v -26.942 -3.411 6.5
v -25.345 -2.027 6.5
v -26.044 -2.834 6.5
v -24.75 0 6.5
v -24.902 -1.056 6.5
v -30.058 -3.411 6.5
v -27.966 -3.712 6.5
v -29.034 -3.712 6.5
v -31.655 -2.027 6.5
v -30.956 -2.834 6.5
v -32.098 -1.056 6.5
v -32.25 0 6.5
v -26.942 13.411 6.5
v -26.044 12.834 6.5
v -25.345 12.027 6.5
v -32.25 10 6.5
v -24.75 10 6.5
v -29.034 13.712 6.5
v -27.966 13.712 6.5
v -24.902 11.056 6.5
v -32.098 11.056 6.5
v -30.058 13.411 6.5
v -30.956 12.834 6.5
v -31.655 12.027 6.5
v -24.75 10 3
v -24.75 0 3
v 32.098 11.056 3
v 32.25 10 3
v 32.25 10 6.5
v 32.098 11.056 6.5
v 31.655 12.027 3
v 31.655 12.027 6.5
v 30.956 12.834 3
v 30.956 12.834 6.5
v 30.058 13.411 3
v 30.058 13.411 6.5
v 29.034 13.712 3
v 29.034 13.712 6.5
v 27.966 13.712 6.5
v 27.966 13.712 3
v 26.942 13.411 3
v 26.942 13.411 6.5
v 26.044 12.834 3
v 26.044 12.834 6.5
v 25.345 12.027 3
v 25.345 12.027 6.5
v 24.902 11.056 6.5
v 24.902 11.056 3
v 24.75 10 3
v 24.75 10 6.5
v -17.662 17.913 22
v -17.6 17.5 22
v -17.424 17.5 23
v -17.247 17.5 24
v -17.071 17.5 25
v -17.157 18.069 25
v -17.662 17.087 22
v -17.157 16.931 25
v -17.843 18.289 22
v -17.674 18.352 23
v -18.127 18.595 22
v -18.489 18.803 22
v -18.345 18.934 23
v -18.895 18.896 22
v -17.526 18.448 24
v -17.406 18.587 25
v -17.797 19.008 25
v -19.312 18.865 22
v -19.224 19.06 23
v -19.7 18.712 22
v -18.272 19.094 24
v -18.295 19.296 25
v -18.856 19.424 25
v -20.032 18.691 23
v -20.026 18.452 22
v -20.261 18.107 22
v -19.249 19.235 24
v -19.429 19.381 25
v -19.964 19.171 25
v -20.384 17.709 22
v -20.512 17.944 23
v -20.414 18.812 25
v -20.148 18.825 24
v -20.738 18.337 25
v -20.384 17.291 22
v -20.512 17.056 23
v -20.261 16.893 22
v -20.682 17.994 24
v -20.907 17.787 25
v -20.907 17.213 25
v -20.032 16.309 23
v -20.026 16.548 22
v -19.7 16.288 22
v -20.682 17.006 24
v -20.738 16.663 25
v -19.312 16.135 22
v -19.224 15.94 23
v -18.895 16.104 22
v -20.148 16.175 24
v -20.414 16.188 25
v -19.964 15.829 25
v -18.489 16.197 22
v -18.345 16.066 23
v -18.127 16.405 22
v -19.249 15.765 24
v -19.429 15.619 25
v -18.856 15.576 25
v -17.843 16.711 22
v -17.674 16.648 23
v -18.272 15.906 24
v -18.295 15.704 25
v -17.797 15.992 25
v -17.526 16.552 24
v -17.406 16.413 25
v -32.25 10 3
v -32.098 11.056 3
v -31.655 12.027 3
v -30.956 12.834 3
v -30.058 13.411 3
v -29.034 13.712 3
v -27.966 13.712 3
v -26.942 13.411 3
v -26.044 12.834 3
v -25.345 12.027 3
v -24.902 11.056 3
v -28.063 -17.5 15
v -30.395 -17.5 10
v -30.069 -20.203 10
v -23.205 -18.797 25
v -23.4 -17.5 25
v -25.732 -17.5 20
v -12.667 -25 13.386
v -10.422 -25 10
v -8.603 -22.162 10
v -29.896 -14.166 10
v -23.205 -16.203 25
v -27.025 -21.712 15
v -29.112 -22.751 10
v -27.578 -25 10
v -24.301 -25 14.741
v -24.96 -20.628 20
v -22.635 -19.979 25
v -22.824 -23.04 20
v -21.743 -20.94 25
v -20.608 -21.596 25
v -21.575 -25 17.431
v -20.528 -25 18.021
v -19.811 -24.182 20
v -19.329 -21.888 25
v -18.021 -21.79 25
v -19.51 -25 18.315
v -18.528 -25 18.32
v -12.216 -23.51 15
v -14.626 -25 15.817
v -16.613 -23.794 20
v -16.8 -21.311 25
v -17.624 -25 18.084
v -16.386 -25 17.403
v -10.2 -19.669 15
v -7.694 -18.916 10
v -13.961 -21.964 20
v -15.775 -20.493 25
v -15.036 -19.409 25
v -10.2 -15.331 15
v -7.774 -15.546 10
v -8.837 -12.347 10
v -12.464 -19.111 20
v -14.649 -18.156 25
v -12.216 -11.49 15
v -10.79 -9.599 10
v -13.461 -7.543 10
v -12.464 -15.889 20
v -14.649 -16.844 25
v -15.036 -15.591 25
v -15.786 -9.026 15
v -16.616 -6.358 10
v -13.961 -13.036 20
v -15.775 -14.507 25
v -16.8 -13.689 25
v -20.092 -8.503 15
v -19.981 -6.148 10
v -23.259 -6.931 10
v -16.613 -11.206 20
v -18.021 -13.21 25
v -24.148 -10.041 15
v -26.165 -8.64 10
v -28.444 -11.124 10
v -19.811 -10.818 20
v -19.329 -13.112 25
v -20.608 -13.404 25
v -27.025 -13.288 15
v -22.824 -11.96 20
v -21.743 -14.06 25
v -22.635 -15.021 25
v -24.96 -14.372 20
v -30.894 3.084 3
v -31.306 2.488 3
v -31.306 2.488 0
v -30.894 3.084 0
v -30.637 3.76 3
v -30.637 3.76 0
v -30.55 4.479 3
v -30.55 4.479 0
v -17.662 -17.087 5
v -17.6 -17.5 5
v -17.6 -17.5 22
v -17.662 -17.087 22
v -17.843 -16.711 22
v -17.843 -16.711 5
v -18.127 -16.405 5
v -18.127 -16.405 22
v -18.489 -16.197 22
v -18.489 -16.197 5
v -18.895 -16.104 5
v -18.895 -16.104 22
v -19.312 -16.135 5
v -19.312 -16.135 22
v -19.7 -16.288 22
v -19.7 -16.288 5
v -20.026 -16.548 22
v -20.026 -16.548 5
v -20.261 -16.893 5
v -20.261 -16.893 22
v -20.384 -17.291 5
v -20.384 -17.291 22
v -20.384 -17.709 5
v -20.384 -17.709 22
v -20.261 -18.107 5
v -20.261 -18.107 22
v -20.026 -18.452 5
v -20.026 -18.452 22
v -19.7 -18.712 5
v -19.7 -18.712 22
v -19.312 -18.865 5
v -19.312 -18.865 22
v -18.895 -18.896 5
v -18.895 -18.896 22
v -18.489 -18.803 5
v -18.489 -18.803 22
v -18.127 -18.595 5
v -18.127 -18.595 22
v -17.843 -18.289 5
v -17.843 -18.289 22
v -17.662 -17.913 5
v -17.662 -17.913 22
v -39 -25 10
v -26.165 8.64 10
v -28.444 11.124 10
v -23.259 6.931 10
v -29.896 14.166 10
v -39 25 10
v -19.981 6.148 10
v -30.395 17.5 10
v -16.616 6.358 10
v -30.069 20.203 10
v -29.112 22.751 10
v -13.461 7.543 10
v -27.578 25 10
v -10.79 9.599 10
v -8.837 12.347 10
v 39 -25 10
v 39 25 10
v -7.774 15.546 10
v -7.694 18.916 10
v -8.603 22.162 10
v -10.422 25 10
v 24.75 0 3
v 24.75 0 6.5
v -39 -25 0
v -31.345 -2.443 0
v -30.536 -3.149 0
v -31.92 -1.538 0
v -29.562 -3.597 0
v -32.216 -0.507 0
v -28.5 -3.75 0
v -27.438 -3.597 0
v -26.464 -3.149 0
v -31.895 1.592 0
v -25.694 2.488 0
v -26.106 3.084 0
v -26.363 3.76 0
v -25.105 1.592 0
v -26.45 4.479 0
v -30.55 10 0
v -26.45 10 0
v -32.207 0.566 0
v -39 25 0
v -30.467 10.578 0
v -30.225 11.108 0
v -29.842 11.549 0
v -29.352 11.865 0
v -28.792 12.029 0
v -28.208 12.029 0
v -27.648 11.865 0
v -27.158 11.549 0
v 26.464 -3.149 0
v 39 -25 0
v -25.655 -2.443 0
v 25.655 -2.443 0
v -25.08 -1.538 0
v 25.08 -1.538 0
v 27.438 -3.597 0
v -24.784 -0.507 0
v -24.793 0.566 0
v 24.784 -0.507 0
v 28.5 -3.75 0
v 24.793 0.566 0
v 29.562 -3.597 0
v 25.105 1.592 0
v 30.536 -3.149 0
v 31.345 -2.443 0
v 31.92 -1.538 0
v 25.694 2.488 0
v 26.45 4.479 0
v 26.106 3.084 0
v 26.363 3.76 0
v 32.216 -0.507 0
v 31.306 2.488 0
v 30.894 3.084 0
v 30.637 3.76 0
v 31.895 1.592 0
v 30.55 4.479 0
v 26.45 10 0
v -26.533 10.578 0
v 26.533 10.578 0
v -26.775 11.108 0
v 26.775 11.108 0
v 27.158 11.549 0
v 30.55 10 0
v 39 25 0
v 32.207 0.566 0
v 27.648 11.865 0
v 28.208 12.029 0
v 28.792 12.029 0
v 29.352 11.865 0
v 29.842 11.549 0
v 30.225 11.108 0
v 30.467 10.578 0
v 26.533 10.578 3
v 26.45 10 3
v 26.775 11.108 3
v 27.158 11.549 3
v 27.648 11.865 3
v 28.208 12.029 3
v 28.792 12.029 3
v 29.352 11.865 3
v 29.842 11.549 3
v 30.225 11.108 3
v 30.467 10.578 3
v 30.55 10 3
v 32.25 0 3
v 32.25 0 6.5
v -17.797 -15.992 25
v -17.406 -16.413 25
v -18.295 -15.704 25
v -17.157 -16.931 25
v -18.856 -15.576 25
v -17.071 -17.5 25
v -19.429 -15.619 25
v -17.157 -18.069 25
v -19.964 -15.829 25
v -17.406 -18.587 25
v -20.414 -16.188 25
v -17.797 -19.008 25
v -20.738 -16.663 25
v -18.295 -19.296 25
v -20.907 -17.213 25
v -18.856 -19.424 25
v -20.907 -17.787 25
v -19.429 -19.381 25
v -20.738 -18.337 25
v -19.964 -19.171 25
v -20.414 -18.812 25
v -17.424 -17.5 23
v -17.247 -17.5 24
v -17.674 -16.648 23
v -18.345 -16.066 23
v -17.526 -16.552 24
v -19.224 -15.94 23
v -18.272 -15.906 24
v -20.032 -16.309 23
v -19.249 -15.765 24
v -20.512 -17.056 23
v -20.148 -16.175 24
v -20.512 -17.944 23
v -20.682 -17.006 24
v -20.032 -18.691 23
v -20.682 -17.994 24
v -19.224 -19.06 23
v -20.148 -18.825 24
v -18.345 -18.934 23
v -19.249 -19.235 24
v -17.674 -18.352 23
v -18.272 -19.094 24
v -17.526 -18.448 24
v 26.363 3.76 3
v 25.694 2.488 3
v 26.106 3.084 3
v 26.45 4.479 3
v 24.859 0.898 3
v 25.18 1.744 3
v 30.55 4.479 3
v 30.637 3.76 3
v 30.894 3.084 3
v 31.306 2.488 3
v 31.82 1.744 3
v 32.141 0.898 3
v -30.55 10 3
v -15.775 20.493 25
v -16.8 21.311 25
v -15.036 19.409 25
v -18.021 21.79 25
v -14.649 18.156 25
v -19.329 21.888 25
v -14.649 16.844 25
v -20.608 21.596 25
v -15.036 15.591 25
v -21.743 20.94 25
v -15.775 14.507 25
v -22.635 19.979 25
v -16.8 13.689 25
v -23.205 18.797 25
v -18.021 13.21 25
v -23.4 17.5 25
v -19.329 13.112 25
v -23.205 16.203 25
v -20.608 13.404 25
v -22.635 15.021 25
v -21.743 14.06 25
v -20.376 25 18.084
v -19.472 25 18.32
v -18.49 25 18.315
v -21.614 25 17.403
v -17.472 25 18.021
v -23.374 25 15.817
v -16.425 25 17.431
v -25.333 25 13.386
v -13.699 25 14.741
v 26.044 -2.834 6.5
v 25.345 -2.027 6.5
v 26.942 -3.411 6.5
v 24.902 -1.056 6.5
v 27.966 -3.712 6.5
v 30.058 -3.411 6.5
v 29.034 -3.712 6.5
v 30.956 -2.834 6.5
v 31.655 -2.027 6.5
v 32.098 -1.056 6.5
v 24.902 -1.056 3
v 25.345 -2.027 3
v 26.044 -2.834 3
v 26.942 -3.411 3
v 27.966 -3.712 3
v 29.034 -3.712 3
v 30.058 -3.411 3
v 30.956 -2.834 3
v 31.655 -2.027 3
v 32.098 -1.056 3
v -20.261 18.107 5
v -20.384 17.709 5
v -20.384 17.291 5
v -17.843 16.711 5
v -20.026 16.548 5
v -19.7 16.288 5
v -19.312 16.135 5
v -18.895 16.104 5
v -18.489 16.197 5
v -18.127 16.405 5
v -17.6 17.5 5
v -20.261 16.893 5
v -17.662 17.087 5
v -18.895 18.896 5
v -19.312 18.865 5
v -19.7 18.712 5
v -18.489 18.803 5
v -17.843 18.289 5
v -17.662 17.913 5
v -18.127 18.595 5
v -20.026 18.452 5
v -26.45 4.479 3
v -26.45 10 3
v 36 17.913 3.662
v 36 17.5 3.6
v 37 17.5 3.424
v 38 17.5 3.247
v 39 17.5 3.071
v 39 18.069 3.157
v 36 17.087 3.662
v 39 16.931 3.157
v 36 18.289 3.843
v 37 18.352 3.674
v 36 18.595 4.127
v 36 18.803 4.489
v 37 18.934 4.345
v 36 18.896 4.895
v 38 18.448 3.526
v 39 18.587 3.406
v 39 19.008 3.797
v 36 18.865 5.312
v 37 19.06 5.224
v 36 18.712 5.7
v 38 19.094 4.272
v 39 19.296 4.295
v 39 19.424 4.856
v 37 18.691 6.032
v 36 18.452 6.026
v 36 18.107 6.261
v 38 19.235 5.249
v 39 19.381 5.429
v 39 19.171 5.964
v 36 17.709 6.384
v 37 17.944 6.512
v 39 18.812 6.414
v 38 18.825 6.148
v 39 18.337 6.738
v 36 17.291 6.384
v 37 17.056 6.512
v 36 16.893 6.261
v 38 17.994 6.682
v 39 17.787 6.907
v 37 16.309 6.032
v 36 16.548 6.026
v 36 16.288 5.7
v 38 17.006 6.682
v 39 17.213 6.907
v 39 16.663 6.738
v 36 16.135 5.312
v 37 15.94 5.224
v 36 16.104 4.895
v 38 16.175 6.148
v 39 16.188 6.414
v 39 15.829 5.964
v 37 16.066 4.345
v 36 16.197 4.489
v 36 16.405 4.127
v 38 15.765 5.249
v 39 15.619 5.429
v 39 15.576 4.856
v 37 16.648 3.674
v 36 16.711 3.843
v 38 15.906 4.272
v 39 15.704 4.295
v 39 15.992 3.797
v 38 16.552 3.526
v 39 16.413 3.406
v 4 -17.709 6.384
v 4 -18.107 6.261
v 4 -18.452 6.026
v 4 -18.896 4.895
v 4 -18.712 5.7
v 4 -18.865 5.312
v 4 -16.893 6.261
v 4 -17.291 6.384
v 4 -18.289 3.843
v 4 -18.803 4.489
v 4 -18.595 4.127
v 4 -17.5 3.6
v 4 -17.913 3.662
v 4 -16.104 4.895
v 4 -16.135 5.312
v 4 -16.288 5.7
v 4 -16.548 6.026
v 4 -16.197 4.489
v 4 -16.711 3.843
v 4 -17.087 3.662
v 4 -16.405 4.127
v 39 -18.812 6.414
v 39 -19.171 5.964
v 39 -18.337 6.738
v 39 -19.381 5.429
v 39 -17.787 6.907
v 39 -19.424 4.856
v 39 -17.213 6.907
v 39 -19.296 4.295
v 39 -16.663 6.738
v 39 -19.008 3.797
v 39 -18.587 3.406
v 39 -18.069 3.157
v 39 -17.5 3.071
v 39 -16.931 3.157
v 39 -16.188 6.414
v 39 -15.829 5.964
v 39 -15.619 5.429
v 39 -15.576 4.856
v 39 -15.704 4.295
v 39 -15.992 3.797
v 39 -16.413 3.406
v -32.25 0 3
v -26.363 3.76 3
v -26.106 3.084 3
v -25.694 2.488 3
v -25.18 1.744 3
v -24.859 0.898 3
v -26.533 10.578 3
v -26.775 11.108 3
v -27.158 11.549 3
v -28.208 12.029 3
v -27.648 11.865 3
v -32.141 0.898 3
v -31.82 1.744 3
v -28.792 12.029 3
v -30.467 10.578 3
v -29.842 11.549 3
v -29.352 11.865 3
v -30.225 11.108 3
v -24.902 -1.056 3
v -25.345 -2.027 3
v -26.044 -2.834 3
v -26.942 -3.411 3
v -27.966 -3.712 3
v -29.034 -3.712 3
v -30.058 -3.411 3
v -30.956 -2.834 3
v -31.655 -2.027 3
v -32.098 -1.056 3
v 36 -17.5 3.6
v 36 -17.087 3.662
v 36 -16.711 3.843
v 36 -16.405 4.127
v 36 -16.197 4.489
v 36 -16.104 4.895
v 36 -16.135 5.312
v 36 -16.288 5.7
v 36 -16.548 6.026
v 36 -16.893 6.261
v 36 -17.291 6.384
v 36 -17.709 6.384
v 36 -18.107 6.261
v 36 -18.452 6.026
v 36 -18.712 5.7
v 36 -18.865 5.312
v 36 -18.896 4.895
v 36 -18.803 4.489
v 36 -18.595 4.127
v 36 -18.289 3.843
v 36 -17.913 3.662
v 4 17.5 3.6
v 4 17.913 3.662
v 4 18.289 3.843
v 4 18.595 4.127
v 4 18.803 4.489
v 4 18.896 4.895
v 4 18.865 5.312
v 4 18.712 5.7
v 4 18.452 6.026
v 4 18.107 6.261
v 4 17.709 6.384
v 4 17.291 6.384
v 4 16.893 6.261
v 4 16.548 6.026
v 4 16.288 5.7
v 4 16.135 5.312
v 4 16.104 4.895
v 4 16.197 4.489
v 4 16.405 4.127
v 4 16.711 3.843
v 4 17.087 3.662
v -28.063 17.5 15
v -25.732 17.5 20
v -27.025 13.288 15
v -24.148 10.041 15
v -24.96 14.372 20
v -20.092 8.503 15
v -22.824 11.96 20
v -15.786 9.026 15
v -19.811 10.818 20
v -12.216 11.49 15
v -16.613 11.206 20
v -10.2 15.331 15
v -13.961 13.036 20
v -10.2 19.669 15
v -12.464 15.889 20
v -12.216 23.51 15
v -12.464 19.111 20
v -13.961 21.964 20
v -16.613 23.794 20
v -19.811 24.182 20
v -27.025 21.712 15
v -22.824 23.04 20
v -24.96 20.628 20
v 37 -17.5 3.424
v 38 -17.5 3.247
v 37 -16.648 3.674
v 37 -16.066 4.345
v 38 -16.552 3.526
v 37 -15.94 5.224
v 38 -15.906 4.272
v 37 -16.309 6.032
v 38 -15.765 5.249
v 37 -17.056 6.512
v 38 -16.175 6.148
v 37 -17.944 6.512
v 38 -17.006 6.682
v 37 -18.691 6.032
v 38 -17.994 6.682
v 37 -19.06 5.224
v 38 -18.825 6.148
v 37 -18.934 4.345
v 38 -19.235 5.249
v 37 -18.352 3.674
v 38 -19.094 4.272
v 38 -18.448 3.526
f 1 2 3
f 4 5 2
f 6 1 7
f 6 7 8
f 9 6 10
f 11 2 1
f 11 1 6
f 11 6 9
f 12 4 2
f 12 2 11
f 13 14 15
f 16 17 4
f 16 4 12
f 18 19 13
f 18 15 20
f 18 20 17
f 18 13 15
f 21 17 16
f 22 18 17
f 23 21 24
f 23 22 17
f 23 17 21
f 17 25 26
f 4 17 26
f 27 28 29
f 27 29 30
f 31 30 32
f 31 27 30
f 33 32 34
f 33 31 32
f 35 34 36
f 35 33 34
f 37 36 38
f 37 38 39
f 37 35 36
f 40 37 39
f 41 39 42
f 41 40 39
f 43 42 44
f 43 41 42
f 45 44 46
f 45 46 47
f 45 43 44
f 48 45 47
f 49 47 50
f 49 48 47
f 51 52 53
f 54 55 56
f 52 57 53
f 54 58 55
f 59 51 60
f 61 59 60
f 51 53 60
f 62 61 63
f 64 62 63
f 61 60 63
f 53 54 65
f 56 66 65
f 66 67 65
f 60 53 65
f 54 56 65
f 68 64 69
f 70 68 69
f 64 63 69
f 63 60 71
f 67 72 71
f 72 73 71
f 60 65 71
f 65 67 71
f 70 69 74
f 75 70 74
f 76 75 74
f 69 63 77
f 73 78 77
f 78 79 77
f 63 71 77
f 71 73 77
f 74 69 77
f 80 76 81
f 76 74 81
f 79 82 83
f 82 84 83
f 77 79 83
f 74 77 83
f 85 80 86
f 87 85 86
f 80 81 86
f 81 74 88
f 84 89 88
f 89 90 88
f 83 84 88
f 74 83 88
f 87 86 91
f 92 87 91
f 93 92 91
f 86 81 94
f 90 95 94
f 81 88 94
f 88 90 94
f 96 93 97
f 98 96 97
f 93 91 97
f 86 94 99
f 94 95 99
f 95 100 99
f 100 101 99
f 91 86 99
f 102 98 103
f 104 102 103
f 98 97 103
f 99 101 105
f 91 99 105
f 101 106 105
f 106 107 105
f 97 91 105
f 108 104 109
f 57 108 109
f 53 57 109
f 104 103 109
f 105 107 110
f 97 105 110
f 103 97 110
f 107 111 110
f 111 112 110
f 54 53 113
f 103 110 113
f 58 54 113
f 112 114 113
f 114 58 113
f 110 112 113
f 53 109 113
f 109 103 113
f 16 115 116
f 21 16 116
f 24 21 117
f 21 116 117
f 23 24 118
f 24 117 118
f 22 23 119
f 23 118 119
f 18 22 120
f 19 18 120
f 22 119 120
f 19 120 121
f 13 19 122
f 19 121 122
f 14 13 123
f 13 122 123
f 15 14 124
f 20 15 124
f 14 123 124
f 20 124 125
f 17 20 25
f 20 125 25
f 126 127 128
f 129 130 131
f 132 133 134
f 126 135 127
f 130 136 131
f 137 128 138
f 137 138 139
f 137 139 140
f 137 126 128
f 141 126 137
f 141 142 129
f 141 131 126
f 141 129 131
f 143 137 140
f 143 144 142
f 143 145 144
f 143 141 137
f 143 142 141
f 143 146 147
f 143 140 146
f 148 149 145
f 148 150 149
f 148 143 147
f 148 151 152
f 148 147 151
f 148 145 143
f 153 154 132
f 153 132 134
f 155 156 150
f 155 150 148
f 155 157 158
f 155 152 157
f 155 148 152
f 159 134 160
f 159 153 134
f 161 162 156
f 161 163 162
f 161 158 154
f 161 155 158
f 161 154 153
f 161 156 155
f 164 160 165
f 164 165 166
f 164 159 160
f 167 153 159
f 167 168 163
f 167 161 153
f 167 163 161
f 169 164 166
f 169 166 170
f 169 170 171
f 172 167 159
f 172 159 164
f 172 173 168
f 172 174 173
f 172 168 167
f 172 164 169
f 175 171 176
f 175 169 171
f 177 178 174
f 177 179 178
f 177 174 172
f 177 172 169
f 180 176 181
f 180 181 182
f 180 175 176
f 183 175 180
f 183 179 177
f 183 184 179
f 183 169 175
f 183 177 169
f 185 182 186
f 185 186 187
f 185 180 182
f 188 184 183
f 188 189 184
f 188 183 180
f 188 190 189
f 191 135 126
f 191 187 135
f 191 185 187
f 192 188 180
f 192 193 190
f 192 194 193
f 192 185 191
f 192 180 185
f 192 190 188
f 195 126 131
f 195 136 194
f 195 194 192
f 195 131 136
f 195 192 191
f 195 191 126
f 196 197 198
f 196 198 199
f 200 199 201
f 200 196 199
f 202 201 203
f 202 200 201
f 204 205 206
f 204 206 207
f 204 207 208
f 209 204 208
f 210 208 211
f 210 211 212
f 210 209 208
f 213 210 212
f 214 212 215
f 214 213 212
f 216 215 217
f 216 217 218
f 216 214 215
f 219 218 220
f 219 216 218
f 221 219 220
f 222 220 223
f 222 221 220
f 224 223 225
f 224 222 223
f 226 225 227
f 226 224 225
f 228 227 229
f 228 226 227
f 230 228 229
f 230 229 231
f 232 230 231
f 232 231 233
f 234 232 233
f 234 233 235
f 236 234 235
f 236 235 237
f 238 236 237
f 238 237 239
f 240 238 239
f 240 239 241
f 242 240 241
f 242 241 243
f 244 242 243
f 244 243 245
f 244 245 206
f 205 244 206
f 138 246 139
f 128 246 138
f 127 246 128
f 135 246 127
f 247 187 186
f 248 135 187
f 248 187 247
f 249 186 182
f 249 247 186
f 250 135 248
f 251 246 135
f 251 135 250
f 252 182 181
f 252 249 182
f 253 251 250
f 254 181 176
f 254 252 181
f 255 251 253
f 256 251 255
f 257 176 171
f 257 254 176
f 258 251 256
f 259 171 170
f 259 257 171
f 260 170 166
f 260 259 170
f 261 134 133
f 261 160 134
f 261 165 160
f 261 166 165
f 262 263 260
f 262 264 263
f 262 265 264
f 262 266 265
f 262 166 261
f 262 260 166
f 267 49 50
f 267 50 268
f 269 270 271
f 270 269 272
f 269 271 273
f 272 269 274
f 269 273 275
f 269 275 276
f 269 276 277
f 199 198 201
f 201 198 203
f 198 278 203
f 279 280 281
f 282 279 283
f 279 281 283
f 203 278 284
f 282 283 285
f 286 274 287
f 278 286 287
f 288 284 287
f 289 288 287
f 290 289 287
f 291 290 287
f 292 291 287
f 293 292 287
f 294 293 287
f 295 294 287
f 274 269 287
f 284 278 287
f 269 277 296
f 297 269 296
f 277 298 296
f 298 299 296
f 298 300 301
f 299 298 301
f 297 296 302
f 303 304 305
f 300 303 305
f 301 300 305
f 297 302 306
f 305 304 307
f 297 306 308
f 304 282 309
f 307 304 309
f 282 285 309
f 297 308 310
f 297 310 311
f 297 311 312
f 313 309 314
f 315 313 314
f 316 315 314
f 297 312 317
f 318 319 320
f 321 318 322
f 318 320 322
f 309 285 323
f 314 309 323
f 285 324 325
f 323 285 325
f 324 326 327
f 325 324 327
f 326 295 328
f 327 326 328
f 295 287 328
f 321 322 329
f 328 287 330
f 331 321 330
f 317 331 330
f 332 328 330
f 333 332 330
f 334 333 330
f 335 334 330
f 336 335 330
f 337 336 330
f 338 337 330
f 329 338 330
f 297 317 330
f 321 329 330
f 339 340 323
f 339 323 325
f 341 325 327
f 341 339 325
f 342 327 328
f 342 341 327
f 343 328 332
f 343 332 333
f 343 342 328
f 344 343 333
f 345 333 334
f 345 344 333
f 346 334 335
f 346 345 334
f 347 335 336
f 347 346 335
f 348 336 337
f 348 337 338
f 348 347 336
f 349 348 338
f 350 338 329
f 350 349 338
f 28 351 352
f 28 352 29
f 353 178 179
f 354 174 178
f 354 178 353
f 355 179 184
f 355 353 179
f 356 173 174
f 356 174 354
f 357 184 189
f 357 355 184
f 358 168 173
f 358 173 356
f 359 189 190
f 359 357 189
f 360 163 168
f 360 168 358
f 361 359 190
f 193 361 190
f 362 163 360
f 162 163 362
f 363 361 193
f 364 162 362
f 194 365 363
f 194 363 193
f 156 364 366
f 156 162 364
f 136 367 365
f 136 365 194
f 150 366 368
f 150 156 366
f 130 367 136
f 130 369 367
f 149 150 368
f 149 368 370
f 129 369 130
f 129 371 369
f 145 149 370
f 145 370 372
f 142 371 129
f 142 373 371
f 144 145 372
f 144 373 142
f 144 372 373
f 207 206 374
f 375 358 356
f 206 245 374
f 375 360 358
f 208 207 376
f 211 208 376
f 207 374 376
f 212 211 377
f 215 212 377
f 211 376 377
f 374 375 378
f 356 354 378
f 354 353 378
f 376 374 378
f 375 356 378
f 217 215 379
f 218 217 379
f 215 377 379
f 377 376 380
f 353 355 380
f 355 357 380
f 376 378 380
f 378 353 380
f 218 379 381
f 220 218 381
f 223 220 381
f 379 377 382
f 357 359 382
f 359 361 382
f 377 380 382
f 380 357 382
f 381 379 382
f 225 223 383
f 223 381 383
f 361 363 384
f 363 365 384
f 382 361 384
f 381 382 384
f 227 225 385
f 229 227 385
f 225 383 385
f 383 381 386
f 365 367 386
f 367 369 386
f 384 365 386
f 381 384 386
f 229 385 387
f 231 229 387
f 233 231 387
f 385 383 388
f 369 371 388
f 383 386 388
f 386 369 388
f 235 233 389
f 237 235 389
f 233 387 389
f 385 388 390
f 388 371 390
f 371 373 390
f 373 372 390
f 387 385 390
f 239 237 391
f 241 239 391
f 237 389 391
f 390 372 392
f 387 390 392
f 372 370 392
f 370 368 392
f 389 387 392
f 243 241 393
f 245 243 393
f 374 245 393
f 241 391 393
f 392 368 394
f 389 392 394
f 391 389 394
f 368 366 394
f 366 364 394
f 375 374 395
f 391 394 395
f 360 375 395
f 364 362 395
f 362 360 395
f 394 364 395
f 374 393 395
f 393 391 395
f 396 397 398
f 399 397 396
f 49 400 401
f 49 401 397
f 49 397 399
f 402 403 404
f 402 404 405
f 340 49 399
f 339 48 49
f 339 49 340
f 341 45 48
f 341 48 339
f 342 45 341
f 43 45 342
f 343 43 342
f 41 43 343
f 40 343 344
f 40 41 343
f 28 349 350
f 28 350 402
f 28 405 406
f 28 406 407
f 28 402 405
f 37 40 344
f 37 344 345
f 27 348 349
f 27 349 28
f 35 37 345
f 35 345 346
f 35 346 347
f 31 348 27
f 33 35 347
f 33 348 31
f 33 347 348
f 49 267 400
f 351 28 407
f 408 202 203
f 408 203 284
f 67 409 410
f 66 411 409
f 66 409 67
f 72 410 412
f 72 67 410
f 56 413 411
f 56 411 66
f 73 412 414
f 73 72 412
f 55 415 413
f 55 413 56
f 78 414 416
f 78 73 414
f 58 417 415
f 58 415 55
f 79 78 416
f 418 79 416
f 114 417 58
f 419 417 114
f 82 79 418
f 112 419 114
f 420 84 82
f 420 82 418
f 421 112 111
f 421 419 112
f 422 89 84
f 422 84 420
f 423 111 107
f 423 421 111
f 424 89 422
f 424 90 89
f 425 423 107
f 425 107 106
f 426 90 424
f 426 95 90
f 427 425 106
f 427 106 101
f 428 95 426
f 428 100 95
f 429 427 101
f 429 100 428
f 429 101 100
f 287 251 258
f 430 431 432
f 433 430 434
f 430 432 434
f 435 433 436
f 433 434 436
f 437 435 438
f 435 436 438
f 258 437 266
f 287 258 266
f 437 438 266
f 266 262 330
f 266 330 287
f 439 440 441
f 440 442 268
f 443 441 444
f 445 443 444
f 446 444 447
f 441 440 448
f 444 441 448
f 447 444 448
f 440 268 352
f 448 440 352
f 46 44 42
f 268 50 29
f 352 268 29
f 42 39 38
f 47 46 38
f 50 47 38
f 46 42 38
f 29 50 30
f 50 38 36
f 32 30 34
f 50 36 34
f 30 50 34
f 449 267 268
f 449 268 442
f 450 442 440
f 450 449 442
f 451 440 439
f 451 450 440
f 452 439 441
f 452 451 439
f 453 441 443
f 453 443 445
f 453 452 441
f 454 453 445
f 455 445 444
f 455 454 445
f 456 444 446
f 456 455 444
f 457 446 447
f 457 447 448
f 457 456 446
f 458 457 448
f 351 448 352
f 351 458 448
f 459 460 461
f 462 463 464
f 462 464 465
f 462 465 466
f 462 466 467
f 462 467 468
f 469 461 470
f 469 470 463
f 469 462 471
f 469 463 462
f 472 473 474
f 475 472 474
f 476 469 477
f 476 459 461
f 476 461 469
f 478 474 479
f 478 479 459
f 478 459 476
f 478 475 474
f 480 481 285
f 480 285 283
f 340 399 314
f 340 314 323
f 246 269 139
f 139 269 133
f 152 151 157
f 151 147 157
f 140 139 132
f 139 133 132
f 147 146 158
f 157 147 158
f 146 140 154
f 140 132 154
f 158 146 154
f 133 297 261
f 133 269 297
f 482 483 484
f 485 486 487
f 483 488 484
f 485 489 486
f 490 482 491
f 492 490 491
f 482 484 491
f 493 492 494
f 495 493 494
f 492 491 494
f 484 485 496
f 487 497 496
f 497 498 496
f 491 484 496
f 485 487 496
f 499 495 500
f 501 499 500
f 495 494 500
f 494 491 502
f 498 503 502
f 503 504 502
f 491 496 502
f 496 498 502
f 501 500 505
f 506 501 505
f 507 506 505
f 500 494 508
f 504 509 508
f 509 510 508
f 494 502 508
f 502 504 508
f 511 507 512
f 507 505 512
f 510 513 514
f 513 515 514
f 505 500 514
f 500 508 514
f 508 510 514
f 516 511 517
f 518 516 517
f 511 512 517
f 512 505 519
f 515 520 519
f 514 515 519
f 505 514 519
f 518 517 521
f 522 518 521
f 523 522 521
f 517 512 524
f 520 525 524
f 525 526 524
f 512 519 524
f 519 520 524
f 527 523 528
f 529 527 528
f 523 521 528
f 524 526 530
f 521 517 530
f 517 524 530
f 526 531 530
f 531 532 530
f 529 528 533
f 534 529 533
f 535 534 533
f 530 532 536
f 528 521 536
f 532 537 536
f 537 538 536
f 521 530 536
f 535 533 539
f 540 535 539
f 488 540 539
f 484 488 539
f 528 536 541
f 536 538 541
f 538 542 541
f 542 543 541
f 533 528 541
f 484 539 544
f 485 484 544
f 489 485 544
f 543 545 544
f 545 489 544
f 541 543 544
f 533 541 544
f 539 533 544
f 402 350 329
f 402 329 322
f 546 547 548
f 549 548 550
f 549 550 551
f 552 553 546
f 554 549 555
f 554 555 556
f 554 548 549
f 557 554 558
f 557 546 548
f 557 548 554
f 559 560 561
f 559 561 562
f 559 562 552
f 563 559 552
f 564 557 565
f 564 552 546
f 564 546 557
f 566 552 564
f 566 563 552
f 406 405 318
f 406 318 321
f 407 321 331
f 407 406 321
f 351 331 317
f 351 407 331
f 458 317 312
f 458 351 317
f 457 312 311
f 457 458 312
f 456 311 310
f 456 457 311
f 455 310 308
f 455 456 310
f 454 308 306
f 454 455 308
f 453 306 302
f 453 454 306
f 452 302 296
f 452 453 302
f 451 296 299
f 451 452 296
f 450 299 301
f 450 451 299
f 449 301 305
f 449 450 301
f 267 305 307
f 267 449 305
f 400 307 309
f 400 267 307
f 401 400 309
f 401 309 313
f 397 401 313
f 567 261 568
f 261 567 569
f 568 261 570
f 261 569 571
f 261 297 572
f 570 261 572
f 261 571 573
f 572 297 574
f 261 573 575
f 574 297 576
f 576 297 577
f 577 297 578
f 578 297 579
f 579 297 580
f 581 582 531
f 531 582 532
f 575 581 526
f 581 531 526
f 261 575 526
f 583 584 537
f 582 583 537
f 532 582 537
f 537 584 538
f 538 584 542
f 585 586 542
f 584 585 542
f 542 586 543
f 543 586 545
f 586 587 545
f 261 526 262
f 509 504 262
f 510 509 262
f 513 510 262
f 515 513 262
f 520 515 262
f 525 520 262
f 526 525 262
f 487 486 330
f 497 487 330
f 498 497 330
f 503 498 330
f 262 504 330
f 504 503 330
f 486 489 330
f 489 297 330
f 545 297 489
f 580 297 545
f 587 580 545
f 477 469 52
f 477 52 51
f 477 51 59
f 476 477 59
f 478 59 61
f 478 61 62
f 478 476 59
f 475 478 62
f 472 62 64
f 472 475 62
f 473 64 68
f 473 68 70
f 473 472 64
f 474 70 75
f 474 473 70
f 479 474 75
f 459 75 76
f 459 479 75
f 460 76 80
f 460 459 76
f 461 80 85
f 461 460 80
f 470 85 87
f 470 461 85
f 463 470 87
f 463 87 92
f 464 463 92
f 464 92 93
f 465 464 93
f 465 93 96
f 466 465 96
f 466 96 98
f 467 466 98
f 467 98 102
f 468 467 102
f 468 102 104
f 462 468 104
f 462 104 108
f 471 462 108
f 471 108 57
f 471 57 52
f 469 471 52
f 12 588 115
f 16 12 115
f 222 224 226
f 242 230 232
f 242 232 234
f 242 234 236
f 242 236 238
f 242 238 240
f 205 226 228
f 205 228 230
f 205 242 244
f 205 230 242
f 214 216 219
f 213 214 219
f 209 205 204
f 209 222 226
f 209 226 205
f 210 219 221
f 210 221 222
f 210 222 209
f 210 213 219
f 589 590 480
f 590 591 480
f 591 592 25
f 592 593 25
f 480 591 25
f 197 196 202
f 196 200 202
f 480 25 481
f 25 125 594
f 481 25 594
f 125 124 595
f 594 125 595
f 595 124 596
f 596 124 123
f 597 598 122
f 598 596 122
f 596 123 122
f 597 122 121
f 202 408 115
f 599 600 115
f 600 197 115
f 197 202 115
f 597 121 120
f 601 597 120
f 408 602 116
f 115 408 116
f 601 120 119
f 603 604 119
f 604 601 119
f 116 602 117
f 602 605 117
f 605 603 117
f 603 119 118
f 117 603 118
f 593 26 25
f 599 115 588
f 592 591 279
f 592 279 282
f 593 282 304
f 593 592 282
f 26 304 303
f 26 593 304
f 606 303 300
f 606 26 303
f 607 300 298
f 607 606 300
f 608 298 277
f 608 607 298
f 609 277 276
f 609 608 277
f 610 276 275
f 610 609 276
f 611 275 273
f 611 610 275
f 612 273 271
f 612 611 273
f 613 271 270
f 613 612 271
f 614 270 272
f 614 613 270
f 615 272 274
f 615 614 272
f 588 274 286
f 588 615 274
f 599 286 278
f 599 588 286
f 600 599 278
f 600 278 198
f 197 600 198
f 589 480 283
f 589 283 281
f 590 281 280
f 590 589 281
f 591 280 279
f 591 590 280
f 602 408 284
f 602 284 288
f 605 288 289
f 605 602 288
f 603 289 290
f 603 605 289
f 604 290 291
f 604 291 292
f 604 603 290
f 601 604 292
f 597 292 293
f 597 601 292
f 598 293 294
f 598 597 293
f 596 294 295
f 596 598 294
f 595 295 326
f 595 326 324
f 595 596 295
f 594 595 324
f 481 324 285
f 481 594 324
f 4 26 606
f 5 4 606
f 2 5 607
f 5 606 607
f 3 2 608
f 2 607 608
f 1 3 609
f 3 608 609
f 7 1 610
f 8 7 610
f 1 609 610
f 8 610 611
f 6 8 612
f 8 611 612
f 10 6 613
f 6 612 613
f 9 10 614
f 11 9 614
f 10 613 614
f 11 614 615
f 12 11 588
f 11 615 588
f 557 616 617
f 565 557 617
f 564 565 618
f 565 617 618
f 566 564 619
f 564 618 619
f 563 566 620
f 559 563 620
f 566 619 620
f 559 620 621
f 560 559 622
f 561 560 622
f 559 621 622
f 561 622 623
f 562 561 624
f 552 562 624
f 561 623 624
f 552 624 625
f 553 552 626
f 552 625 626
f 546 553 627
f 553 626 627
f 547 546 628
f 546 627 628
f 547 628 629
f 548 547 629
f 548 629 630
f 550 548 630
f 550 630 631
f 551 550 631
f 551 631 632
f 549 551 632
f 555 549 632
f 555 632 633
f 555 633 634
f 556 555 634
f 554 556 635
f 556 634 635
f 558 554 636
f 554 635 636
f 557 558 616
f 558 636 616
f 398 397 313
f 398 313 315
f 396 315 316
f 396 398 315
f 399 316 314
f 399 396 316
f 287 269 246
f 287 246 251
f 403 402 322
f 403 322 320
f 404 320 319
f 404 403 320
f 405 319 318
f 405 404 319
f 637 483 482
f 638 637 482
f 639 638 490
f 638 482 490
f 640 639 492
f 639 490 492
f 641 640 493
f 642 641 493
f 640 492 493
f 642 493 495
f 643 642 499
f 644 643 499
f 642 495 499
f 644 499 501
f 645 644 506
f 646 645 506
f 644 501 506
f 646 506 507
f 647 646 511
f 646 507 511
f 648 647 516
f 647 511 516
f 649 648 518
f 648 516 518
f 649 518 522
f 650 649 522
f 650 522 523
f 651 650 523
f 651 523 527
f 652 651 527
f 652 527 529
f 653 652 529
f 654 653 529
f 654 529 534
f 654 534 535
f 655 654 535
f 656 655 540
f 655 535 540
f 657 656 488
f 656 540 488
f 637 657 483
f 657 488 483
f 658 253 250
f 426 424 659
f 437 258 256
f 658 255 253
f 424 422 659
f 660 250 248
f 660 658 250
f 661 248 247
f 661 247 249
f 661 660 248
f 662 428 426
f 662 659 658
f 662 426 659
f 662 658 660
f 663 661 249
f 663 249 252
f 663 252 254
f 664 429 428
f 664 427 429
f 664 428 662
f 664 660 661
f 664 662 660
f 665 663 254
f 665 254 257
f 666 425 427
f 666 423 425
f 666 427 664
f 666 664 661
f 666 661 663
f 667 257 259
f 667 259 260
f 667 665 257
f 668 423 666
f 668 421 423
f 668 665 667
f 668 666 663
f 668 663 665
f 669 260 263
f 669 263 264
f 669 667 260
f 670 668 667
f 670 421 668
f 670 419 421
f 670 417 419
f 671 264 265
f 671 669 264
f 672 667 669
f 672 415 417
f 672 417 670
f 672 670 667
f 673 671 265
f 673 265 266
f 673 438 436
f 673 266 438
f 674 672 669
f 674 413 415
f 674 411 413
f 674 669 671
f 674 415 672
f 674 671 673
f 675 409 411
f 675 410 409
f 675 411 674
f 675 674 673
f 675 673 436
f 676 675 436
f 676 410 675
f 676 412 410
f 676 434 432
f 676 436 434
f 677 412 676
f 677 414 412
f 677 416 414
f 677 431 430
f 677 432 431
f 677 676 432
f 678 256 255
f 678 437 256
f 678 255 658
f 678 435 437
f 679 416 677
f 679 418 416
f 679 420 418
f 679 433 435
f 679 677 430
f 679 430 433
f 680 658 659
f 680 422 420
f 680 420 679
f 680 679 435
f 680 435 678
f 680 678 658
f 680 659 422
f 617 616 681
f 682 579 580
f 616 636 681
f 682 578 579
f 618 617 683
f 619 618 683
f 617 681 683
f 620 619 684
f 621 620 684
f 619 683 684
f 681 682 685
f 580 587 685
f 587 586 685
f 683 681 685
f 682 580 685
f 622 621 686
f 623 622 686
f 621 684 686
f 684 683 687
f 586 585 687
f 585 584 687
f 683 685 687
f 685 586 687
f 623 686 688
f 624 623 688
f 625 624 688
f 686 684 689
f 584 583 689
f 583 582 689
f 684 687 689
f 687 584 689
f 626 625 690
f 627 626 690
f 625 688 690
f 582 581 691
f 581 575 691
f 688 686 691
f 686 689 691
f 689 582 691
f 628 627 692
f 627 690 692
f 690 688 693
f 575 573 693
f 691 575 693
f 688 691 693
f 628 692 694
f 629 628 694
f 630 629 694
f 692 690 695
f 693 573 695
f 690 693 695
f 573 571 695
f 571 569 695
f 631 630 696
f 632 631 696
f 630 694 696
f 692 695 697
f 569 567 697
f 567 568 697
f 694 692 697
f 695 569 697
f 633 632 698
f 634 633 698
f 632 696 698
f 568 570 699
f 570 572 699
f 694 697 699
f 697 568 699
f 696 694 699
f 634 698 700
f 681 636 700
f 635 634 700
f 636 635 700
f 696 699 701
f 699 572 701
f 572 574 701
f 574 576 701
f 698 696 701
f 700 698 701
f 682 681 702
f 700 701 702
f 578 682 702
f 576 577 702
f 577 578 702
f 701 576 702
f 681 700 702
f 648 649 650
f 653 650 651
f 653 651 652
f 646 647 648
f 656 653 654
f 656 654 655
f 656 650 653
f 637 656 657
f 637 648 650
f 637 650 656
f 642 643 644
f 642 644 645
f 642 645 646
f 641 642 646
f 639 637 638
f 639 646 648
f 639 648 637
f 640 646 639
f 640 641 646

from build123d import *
from OCP.BRepFilletAPI import BRepFilletAPI_MakeChamfer

# Parameters (mm, degrees)
SKETCH1_W           = 78
SKETCH1_H           = 50
BOSS_EXTRUDE1_DEPTH = 10
SKETCH3_R           = 4.4
SKETCH3_R_2         = 1.4
BOSS_EXTRUDE2_DEPTH = 15
CUT_EXTRUDE2_START  = -5
SKETCH4_R           = 1.4
CUT_EXTRUDE2_DEPTH  = 5
SKETCH5_R           = 1.4
CUT_EXTRUDE3_DEPTH  = 35
CHAMFER1_SIZE       = 3
CHAMFER1_SIZE2      = 0.528980942
CHAMFER2_SIZE       = 6.994614872
CHAMFER2_SIZE_2     = 15
CUT_EXTRUDE4_START  = -3
CUT_EXTRUDE4_DEPTH  = 3.5
CUT_EXTRUDE5_START  = -3
CUT_EXTRUDE5_DEPTH  = 3


# Read off the part's stored shape, not the designer's step: Cut-Extrude5
with BuildPart() as part:
    # Sketch1 → Boss-Extrude1 (new body)
    with BuildSketch(Plane.XY):
        Rectangle(SKETCH1_W, SKETCH1_H)
    extrude(amount=BOSS_EXTRUDE1_DEPTH)

    # Sketch3 → Boss-Extrude2 (add)
    # profile 1 of 2: a face of its own
    with BuildSketch(Plane.XY.offset(10)):
        with Locations(Location((-19, 17.5, 0), (0, 0, 180))):
            Circle(SKETCH3_R)
        with Locations((-19, 17.5)):
            Circle(SKETCH3_R_2, mode=Mode.SUBTRACT)
    # profile 2 of 2: a face of its own
    with BuildSketch(Plane.XY.offset(10)):
        with Locations(Location((-19, -17.5, 0), (0, 0, 180))):
            Circle(SKETCH3_R)
        with Locations((-19, -17.5)):
            Circle(SKETCH3_R_2, mode=Mode.SUBTRACT)
    extrude(amount=BOSS_EXTRUDE2_DEPTH)

    # Sketch4 → Cut-Extrude2 (cut)
    with BuildSketch(Plane.XY.offset(10).offset(CUT_EXTRUDE2_START)):
        with Locations((-19, 17.5)):
            Circle(SKETCH4_R)
        with Locations((-19, -17.5)):
            Circle(SKETCH4_R)
    extrude(amount=CUT_EXTRUDE2_DEPTH, mode=Mode.SUBTRACT)

    # Sketch5 → Cut-Extrude3 (cut)
    with BuildSketch(Plane(origin=(39, 0, 0), x_dir=(0, 0, -1), z_dir=(1, 0, 0))):
        with Locations((-5, 17.5)):
            Circle(SKETCH5_R)
        with Locations((-5, -17.5)):
            Circle(SKETCH5_R)
    extrude(amount=-CUT_EXTRUDE3_DEPTH, mode=Mode.SUBTRACT)

    # Chamfer1: one chamfer whose edges measure the first distance from different faces: ONE call of the kernel's chamfer builder (chamfer() names one face for all edges)
    chamfer1_edges_1 = [part.edges().sort_by_distance(p)[0] for p in [
        (-20.4, -17.5, 25),
    ]]
    chamfer1_side_1 = [part.faces().sort_by_distance(p)[0] for p in [
        (-20.4, -17.5, 15),
    ]]
    chamfer1_edges_2 = [part.edges().sort_by_distance(p)[0] for p in [
        (-20.4, 17.5, 25),
    ]]
    chamfer1_side_2 = [part.faces().sort_by_distance(p)[0] for p in [
        (-20.4, 17.5, 15),
    ]]
    chamfer1_edges_3 = [part.edges().sort_by_distance(p)[0] for p in [
        (39, 17.5, 6.4),
    ]]
    chamfer1_side_3 = [part.faces().sort_by_distance(p)[0] for p in [
        (21.5, 17.5, 6.4),
    ]]
    chamfer1_edges_4 = [part.edges().sort_by_distance(p)[0] for p in [
        (39, -17.5, 6.4),
    ]]
    chamfer1_side_4 = [part.faces().sort_by_distance(p)[0] for p in [
        (21.5, -17.5, 6.4),
    ]]
    chamfer1 = BRepFilletAPI_MakeChamfer(part.part.solid().wrapped)
    for e in chamfer1_edges_1:
        chamfer1.Add(CHAMFER1_SIZE, CHAMFER1_SIZE2, e.wrapped, chamfer1_side_1[0].wrapped)  # the first distance lies on this face
    for e in chamfer1_edges_2:
        chamfer1.Add(CHAMFER1_SIZE, CHAMFER1_SIZE2, e.wrapped, chamfer1_side_2[0].wrapped)  # the first distance lies on this face
    for e in chamfer1_edges_3:
        chamfer1.Add(CHAMFER1_SIZE, CHAMFER1_SIZE2, e.wrapped, chamfer1_side_3[0].wrapped)  # the first distance lies on this face
    for e in chamfer1_edges_4:
        chamfer1.Add(CHAMFER1_SIZE, CHAMFER1_SIZE2, e.wrapped, chamfer1_side_4[0].wrapped)  # the first distance lies on this face
    add(Compound.cast(chamfer1.Shape()), mode=Mode.REPLACE)

    # Chamfer2
    # the kernel refuses this chamfer: 15, 6.994614872 mm, written as the material it adds along each edge
    with BuildSketch(Plane(origin=(-19, 17.5, 10), x_dir=(-1, 0, 0), z_dir=(0, 1, 0))) as chamfer2_piece_1_section:
        Polygon((4.4 + CHAMFER2_SIZE, 0), (4.4, CHAMFER2_SIZE_2), (4.4, 0), align=None)
    chamfer2_piece_1 = revolve(axis=Axis((-19, 17.5, 10), (0, 0, 1)), mode=Mode.PRIVATE)
    chamfer2_piece_1 = split(chamfer2_piece_1, bisect_by=Plane(origin=(-11.096055179, 25, 17.172081688), z_dir=(0, -1, 0)), keep=Keep.TOP, mode=Mode.PRIVATE)
    chamfer2_piece_1 = split(chamfer2_piece_1, bisect_by=Plane(origin=(-11.096055179, 17.5, 25), z_dir=(0, 0, -1)), keep=Keep.TOP, mode=Mode.PRIVATE)
    add(chamfer2_piece_1)
    with BuildSketch(Plane(origin=(-19, -17.5, 10), x_dir=(-1, 0, 0), z_dir=(0, 1, 0))) as chamfer2_piece_2_section:
        Polygon((4.4 + CHAMFER2_SIZE, 0), (4.4, CHAMFER2_SIZE_2), (4.4, 0), align=None)
    chamfer2_piece_2 = revolve(axis=Axis((-19, -17.5, 10), (0, 0, 1)), mode=Mode.PRIVATE)
    chamfer2_piece_2 = split(chamfer2_piece_2, bisect_by=Plane(origin=(-11.096055179, -25, 17.172081688), z_dir=(0, 1, 0)), keep=Keep.TOP, mode=Mode.PRIVATE)
    chamfer2_piece_2 = split(chamfer2_piece_2, bisect_by=Plane(origin=(-11.096055179, -17.5, 25), z_dir=(0, 0, -1)), keep=Keep.TOP, mode=Mode.PRIVATE)
    add(chamfer2_piece_2)

    # Sketch6 → Cut-Extrude4 (cut)
    with BuildSketch(Plane(origin=(0, 0, 0), x_dir=(-1, 0, 0), z_dir=(0, 0, -1)).offset(CUT_EXTRUDE4_START)):
        with BuildLine():
            Line((-24.75, 10), (-24.75, 0))
            ThreePointArc((-24.75, 0), (-28.5, -3.75), (-32.25, 0))
            Line((-32.25, 0), (-32.25, 10))
            ThreePointArc((-32.25, 10), (-28.5, 13.75), (-24.75, 10))
        make_face()
        with BuildLine():
            Line((24.75, 10), (24.75, 0))
            ThreePointArc((24.75, 0), (28.5, -3.75), (32.25, 0))
            Line((32.25, 0), (32.25, 10))
            ThreePointArc((32.25, 10), (28.5, 13.75), (24.75, 10))
        make_face()
    extrude(amount=-CUT_EXTRUDE4_DEPTH, mode=Mode.SUBTRACT)

    # Cut-Extrude5 outline → Cut-Extrude5 (cut)
    with BuildSketch(Plane(origin=(0, 0, 0), x_dir=(-1, 0, 0), z_dir=(0, 0, -1)).offset(CUT_EXTRUDE5_START)):
        with BuildLine():
            ThreePointArc((26.45, 4.478839135), (26.254757862, 3.41425784), (25.694444444, 2.488243964))
            ThreePointArc((25.694444444, 2.488243964), (28.5, -3.75), (31.305555556, 2.488243964))
            ThreePointArc((31.305555556, 2.488243964), (30.745242138, 3.41425784), (30.55, 4.478839135))
            Line((30.55, 4.478839135), (30.55, 10))
            ThreePointArc((30.55, 10), (28.5, 12.05), (26.45, 10))
            Line((26.45, 10), (26.45, 4.478839135))
        make_face()
        with BuildLine():
            ThreePointArc((-25.694444444, 2.488243964), (-26.254757862, 3.41425784), (-26.45, 4.478839135))
            Line((-26.45, 4.478839135), (-26.45, 10))
            ThreePointArc((-26.45, 10), (-28.5, 12.05), (-30.55, 10))
            Line((-30.55, 10), (-30.55, 4.478839135))
            ThreePointArc((-30.55, 4.478839135), (-30.745242138, 3.41425784), (-31.305555556, 2.488243964))
            ThreePointArc((-31.305555556, 2.488243964), (-28.5, -3.75), (-25.694444444, 2.488243964))
        make_face()
    extrude(amount=CUT_EXTRUDE5_DEPTH, mode=Mode.SUBTRACT)


solid = part.part
